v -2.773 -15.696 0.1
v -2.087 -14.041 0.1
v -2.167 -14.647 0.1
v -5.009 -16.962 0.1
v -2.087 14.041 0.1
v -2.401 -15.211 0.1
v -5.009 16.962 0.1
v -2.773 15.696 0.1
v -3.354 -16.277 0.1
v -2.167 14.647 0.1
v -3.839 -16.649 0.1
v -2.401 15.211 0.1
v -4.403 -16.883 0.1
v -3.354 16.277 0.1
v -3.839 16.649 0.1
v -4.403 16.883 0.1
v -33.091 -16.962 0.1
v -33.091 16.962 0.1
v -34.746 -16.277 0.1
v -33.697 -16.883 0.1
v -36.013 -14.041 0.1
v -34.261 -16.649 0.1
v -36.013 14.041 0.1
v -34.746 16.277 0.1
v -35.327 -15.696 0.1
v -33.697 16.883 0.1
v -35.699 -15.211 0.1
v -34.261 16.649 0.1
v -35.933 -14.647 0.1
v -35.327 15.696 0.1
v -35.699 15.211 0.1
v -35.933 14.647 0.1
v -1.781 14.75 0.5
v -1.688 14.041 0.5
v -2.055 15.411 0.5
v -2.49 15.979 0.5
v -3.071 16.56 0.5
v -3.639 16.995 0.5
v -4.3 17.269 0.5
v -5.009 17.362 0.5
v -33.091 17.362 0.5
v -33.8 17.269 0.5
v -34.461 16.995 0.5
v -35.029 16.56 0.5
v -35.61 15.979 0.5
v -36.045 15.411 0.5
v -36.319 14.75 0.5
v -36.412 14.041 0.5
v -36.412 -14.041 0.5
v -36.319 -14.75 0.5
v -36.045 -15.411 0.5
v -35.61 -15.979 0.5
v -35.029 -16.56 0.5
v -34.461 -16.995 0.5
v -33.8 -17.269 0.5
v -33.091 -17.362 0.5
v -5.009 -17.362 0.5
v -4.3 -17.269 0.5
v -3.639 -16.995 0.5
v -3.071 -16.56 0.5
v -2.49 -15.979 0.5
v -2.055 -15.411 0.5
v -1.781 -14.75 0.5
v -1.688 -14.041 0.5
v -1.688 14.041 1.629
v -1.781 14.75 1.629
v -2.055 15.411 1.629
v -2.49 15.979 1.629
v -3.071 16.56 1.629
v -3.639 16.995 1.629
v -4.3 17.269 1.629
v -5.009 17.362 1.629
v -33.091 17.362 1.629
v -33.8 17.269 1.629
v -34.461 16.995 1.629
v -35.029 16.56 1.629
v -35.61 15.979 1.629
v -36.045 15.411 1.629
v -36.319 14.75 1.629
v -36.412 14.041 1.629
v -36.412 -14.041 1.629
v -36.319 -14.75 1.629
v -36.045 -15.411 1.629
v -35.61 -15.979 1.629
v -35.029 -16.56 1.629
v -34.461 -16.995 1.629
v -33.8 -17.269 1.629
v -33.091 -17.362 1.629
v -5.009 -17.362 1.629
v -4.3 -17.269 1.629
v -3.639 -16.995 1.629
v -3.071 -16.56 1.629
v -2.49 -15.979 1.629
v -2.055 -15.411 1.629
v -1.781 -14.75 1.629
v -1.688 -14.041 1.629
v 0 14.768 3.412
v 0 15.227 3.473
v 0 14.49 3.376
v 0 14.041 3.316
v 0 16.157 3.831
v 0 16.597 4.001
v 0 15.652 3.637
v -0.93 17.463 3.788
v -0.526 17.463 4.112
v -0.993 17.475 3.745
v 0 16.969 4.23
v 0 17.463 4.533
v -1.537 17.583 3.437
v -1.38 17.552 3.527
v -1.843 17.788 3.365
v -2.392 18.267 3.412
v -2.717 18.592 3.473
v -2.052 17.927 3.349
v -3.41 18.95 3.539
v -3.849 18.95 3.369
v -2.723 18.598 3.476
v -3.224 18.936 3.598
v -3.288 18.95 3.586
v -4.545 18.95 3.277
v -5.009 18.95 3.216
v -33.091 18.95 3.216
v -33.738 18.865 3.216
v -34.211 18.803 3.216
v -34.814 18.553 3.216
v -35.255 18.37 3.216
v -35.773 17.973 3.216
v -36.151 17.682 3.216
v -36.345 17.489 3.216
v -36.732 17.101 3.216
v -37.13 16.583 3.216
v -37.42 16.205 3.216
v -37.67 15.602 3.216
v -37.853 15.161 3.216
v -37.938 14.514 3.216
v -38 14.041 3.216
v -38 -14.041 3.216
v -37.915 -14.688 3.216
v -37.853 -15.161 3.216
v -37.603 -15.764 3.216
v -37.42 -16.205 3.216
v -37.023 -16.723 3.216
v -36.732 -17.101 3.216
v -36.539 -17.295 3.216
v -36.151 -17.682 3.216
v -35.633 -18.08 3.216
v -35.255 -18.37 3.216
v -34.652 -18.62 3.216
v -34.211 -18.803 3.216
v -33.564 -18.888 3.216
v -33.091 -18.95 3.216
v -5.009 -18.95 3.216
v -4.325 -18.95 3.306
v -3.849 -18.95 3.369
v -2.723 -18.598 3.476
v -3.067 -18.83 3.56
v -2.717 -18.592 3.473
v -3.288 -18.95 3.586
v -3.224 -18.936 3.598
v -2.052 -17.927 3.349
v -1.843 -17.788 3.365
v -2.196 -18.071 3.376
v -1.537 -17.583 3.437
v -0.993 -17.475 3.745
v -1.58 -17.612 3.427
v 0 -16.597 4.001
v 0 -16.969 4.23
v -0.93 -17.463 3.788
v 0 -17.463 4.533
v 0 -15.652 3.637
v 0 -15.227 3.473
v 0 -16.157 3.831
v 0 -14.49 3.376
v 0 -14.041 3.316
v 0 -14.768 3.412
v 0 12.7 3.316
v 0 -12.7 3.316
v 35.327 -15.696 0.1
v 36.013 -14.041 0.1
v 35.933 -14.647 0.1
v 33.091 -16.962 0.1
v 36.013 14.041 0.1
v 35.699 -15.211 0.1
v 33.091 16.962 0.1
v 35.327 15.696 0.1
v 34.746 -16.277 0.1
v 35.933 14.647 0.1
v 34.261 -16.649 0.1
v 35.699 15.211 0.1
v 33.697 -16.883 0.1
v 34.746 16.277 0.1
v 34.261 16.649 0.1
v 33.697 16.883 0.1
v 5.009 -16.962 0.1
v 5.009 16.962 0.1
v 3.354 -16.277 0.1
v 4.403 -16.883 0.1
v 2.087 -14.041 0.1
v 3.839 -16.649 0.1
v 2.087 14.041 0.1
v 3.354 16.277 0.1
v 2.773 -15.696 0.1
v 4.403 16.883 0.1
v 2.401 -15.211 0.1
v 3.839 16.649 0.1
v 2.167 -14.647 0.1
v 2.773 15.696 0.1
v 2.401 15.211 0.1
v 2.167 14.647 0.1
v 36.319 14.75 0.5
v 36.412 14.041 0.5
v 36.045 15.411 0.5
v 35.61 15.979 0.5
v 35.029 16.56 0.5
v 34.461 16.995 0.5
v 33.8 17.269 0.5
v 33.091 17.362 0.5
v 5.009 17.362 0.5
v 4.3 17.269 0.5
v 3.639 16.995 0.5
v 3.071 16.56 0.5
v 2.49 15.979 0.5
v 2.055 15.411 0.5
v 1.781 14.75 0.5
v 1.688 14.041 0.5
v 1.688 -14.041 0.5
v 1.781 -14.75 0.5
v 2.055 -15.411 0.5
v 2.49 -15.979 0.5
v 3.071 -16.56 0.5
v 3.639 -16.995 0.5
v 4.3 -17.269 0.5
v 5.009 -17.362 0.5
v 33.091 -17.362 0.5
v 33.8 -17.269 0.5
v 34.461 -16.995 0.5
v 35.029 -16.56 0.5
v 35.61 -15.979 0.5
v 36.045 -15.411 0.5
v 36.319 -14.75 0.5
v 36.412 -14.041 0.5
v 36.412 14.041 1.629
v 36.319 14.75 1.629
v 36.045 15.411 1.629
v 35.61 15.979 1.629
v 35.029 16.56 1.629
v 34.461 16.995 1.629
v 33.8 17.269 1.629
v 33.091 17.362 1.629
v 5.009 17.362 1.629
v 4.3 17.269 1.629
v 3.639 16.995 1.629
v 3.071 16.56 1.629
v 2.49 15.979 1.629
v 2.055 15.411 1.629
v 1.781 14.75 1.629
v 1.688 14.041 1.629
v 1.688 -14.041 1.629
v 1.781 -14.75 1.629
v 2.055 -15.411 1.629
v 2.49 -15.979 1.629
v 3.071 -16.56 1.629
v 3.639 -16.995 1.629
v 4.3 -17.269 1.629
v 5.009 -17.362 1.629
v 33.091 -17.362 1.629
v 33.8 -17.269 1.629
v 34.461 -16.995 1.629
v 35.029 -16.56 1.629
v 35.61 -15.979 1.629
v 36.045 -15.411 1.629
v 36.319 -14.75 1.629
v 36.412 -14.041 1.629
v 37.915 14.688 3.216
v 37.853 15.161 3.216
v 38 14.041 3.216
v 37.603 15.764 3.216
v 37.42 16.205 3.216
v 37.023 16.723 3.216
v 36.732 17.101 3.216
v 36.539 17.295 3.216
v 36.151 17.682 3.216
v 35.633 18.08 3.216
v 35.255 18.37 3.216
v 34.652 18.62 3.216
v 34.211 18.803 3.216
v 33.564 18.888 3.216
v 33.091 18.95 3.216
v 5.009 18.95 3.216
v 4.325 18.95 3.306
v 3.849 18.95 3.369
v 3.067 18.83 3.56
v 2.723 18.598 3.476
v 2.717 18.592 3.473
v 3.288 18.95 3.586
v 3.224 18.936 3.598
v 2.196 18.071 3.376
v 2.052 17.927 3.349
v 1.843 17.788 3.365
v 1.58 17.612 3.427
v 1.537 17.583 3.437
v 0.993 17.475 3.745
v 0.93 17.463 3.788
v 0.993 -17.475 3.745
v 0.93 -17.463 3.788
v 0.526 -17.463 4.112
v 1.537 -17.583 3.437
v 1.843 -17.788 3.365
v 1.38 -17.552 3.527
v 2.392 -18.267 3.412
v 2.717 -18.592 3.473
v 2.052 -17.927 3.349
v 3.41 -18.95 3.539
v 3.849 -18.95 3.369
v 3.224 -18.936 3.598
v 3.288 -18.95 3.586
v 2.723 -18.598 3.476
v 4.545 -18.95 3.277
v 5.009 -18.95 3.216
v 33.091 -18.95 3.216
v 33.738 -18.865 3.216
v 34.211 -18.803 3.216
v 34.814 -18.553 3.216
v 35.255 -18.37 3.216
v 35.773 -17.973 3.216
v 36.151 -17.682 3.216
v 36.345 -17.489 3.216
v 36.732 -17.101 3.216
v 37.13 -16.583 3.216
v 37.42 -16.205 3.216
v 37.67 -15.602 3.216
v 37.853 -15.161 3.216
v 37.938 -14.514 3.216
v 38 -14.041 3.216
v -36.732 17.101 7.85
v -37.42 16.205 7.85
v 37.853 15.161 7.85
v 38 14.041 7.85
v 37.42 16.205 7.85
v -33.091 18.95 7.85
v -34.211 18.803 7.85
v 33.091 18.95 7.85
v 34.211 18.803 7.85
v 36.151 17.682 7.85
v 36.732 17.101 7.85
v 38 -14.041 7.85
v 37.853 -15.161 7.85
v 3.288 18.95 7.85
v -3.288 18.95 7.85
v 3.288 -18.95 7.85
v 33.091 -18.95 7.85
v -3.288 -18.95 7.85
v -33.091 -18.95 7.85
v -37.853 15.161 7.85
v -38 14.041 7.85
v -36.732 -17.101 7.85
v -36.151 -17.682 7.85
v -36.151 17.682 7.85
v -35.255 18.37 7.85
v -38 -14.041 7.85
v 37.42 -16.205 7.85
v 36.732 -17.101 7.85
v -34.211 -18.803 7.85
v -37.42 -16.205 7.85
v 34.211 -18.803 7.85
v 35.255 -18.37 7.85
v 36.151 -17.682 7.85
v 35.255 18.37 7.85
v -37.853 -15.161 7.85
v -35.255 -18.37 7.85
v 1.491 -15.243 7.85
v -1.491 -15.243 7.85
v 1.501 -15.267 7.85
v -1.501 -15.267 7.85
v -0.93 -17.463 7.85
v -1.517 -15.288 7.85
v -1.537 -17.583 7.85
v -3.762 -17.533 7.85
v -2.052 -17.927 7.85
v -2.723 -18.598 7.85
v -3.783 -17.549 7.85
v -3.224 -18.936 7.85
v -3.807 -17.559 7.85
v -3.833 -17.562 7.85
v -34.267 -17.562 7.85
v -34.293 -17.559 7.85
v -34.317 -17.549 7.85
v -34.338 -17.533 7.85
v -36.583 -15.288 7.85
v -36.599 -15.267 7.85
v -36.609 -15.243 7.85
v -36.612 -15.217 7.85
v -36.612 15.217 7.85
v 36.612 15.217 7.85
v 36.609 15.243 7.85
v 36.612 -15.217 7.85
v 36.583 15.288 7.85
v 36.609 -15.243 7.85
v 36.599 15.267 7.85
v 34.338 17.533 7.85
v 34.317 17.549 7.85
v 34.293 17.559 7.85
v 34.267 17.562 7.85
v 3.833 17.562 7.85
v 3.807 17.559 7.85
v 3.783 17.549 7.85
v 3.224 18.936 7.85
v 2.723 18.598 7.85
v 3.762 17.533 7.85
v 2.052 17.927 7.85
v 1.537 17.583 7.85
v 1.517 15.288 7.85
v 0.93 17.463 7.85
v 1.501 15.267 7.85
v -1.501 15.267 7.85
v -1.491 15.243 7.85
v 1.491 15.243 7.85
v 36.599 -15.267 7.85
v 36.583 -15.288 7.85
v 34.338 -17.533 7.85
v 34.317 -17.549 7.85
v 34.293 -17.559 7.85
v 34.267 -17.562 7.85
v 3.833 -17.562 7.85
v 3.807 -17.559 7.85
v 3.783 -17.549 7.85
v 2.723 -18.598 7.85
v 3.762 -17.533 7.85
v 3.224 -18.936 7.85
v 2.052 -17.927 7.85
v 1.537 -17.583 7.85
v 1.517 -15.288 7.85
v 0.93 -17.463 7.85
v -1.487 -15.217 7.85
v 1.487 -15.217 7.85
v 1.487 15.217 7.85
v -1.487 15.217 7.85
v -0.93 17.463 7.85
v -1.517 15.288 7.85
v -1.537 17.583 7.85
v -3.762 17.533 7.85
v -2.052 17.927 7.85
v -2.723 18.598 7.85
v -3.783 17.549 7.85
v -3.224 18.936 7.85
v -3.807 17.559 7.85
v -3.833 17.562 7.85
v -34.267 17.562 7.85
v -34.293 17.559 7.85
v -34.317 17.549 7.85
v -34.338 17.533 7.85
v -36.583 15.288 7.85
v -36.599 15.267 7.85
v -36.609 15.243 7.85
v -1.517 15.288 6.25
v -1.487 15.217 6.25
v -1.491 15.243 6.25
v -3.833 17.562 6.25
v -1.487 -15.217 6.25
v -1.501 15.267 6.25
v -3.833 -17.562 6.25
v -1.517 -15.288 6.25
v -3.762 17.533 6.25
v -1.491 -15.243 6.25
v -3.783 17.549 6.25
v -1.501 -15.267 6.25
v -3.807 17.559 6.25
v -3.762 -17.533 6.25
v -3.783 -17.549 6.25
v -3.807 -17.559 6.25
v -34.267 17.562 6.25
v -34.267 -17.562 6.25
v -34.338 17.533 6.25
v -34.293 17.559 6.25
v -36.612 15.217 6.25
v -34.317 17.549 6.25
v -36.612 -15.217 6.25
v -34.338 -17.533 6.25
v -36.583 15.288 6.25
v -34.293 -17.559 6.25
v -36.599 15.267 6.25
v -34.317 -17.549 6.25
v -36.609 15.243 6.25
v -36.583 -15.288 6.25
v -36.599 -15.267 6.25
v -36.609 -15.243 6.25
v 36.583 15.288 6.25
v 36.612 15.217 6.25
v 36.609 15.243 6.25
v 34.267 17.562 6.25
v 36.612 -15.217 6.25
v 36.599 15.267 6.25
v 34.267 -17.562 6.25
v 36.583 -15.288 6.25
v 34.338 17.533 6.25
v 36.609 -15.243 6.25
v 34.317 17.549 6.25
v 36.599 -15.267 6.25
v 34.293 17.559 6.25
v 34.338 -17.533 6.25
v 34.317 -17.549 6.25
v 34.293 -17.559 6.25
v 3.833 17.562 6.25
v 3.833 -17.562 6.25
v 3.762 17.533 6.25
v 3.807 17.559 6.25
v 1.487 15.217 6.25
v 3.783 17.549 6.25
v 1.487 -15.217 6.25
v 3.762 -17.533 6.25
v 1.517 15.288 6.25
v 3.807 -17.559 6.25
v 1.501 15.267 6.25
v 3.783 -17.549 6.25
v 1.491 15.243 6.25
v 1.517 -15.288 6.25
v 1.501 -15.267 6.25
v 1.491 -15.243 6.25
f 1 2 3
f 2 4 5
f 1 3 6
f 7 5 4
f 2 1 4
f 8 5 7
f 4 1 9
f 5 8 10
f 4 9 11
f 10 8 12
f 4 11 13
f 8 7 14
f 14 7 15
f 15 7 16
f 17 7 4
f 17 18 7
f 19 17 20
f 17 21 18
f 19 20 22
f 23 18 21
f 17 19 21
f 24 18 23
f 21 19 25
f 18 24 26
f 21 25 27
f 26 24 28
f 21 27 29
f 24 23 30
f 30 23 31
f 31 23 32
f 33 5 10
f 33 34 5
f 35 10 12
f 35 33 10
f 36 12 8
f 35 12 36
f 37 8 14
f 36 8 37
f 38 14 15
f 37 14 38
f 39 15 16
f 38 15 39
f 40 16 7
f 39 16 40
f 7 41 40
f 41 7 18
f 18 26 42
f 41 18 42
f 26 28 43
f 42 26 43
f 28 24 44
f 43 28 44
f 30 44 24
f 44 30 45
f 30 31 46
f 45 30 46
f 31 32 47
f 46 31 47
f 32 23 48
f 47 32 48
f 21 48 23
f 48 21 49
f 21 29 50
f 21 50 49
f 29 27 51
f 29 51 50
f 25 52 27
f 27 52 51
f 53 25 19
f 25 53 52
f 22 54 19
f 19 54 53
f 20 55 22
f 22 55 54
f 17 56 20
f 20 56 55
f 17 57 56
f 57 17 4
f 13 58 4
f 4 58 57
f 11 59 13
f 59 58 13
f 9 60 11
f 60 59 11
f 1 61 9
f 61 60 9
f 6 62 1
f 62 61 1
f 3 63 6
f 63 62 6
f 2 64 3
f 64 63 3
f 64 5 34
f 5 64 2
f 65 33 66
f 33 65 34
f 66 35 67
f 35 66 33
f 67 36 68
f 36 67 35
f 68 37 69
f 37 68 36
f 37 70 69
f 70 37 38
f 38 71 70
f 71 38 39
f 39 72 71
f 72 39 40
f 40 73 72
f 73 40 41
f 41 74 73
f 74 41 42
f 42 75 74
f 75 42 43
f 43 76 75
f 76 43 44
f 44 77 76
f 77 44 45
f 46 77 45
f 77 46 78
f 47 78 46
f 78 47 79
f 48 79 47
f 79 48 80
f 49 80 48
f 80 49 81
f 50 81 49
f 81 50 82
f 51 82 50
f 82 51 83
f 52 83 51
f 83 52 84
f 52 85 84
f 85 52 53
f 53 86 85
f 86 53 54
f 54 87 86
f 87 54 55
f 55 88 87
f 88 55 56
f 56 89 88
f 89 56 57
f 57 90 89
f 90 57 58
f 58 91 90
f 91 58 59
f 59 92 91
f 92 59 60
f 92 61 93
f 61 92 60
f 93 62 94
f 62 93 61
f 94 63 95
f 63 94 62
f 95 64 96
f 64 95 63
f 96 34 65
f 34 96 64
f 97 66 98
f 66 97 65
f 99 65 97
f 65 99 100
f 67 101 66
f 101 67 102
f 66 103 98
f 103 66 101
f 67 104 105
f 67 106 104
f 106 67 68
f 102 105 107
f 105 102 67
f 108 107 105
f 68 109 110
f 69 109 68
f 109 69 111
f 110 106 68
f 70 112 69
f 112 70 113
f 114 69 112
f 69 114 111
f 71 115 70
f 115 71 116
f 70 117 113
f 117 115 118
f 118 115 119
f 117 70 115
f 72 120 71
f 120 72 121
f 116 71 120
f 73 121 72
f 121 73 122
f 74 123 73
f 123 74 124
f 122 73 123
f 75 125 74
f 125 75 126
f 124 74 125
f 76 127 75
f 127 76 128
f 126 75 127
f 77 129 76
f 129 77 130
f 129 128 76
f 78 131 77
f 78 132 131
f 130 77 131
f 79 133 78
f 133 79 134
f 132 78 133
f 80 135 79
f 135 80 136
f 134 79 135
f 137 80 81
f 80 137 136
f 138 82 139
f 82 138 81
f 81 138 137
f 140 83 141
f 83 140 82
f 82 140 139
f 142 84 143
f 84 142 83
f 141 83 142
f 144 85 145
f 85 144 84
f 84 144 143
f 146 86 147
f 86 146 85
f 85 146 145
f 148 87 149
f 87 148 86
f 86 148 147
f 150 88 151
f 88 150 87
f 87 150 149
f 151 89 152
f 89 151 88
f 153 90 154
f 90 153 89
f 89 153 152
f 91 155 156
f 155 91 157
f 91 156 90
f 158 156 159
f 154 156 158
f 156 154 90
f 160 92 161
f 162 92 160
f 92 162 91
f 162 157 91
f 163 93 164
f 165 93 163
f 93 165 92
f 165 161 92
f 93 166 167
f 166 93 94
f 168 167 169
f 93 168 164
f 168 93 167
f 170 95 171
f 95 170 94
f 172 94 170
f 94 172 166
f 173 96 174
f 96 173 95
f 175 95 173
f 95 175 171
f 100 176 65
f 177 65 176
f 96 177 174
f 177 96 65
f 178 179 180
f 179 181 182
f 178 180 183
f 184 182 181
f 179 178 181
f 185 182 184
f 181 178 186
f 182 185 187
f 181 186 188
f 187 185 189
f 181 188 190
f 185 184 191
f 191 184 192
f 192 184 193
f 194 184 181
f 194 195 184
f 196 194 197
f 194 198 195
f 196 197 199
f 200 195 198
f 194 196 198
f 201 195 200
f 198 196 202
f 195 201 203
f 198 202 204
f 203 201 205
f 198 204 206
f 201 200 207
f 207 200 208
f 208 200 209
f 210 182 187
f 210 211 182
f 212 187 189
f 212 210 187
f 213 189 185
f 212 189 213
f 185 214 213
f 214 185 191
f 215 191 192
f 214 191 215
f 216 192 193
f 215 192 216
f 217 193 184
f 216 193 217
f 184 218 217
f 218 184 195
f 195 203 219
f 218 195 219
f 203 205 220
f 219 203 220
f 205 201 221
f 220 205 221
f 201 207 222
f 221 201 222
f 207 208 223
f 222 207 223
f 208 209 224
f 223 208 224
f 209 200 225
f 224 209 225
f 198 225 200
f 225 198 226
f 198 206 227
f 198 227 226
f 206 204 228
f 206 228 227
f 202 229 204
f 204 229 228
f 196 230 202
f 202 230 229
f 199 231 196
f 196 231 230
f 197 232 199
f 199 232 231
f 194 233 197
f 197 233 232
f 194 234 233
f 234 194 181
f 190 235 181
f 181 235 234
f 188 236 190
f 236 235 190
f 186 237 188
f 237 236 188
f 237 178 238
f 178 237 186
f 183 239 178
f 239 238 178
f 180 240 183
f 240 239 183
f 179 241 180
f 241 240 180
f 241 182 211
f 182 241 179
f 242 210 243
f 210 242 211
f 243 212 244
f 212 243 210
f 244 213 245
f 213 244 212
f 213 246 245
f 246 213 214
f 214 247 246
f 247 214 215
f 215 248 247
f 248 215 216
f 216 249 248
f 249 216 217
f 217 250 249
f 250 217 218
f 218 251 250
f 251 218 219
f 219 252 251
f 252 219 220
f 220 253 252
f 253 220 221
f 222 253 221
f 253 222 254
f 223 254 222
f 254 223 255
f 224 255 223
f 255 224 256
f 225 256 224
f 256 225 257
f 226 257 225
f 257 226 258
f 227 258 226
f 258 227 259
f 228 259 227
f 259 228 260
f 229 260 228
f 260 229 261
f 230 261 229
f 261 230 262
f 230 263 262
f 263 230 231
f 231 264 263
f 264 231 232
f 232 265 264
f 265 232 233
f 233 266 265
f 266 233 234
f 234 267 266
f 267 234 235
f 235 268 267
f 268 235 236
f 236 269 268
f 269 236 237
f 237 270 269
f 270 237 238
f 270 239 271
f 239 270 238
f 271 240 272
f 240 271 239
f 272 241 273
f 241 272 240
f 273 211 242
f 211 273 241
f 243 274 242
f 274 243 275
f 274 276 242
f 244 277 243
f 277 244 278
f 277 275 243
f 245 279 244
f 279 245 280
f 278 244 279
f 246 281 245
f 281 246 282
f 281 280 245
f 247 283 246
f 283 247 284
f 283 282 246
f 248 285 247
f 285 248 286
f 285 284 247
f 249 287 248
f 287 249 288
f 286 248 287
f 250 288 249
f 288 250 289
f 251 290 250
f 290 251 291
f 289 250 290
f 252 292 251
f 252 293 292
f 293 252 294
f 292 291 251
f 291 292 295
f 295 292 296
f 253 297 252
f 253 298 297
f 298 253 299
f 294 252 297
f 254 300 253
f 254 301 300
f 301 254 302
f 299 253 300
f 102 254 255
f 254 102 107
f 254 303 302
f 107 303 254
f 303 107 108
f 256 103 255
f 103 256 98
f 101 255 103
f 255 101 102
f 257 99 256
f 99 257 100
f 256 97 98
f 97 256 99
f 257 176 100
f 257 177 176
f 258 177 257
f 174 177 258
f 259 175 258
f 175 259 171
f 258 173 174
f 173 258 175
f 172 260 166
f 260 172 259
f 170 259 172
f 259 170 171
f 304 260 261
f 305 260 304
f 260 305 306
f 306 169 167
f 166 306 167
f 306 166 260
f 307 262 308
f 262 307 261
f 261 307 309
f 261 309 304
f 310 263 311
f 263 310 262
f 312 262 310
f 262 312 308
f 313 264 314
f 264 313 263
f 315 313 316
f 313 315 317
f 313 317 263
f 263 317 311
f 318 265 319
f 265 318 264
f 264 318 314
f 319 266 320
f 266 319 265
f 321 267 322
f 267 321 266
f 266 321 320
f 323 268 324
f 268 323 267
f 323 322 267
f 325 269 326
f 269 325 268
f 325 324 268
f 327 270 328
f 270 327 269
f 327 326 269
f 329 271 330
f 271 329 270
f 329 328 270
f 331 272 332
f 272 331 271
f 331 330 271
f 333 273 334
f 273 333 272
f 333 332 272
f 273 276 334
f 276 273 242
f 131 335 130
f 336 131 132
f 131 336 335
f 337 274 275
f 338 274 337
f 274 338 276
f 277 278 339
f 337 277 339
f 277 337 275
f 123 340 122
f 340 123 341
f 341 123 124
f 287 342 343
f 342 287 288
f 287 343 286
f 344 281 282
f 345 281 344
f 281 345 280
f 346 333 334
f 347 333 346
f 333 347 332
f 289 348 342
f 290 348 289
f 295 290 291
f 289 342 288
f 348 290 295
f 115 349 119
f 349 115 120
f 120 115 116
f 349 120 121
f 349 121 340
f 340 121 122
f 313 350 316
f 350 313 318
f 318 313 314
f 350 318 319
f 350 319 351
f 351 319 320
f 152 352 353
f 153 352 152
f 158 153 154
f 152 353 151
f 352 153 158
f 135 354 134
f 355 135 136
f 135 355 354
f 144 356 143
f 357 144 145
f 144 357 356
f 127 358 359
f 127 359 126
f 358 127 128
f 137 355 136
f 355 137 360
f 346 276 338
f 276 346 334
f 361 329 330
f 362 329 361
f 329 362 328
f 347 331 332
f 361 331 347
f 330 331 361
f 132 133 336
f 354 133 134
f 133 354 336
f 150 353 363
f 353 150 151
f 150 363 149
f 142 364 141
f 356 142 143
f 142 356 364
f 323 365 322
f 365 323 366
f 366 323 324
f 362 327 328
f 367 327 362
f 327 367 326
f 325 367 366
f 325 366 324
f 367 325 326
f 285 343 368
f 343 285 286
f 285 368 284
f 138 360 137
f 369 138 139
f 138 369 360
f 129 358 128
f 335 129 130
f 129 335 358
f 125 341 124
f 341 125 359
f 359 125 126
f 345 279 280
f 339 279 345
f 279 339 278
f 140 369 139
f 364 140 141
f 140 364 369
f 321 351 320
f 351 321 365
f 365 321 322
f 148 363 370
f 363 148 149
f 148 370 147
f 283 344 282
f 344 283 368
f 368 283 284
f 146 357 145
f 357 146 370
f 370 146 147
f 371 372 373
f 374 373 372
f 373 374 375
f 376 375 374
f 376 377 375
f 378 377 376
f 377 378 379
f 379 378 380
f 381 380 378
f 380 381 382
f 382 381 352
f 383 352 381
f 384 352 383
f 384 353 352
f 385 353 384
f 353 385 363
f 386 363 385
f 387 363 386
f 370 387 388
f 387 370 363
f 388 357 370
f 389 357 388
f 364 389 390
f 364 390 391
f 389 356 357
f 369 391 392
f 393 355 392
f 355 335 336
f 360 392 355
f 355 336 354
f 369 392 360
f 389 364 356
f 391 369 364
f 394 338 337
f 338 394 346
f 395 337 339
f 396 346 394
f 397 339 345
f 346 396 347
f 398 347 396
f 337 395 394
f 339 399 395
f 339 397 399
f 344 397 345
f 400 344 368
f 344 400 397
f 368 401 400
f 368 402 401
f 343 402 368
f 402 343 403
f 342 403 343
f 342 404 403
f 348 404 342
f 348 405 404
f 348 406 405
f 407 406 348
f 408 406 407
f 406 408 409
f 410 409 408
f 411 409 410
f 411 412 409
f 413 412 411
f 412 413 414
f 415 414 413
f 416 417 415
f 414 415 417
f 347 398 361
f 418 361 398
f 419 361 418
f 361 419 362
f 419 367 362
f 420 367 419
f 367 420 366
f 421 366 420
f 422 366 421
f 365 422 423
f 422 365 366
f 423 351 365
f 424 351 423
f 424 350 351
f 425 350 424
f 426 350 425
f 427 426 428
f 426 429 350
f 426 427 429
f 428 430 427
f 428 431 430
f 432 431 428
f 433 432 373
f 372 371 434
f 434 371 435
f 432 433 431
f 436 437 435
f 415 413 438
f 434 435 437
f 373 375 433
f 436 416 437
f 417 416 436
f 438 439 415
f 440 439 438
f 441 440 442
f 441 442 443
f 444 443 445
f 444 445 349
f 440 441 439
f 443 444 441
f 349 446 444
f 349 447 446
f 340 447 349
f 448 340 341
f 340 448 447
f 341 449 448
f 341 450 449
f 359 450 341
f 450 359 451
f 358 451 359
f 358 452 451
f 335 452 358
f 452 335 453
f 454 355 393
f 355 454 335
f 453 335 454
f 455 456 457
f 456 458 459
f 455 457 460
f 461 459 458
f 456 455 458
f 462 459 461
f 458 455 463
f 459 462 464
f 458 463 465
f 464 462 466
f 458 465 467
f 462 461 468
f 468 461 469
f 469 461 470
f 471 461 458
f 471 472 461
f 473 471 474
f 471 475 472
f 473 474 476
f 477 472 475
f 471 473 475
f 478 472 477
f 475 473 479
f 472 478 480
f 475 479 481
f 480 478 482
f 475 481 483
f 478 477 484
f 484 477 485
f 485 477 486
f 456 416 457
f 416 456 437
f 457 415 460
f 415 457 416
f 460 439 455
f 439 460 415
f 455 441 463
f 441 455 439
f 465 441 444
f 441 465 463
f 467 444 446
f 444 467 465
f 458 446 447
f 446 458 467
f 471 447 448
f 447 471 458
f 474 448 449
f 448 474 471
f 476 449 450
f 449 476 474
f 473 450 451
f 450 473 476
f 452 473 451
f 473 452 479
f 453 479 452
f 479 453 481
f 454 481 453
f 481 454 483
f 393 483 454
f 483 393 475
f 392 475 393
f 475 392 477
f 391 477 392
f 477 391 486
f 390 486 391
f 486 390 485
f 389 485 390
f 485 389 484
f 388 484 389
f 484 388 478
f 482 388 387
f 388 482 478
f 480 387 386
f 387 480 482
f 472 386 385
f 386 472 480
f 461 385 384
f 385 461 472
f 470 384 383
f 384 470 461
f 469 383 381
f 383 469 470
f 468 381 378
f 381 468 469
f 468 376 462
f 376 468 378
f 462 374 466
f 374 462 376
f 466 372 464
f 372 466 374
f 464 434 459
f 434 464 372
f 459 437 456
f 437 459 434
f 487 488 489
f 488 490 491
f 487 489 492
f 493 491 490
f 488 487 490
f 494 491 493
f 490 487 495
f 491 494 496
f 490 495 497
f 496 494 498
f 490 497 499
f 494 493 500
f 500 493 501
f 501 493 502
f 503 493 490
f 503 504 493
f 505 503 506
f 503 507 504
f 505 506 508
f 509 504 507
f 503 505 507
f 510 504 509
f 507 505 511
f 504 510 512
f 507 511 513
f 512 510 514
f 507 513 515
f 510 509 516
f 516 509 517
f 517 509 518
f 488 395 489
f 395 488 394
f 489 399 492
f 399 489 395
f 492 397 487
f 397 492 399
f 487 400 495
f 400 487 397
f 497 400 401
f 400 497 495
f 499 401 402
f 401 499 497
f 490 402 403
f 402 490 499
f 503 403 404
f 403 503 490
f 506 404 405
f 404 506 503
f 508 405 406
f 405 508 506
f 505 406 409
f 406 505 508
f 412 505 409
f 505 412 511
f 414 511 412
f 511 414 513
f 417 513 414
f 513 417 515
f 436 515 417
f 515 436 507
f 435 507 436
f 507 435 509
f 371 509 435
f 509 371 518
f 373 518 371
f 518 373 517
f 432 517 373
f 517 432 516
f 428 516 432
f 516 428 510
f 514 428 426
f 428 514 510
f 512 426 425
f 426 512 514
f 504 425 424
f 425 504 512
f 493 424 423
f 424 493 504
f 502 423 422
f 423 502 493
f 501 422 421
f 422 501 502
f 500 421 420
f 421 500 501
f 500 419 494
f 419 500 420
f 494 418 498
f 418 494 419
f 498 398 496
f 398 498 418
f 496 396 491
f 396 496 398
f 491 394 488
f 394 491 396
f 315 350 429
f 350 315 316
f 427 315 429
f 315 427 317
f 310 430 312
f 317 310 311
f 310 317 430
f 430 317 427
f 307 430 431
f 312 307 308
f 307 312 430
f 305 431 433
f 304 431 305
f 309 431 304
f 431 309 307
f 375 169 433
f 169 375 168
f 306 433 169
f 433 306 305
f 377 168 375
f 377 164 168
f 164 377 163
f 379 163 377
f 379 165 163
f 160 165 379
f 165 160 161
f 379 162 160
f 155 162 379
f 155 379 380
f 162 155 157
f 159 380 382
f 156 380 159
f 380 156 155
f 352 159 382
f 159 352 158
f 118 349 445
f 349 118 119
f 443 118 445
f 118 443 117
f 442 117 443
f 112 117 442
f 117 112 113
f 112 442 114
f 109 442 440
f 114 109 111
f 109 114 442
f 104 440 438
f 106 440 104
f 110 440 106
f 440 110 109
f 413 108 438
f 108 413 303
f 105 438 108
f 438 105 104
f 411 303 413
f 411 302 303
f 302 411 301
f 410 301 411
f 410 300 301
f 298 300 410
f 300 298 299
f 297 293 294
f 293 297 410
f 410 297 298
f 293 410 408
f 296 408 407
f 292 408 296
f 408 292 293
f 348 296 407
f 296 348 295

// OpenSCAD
// ChunkyPlate0.1
// 
// Baseplate that intentionally 'comes in between chunks'
// to leave room for string/tape

block_size = ["2chunk","1chunk","1/4inch"];
bottom_segmentation = "chunk";
bottom_v6hc_style = "none"; // ["none","v6.1"]
bottom_foot_bevel = "0.4mm";
top_segmentation = "chunk";
top_v6hc_style = "none"; // ["none","v6.1"]
foot_rounding = 0.7; // [0.25:0.1:1]
notch_depth = "1/8inch";
notch_width = "1/4inch";
lip_height = 1.5;

cross_section = false;

$fn = 24;
$tgx11_offset = -0.1;

module __chunkyplate0__end_params() { }

use <../lib/TOGArrayLib1.scad>
use <../lib/TGx11.1Lib.scad>
use <../lib/TOGMod1.scad>
use <../lib/TOGMod1Constructors.scad>
use <../lib/TOGPath1.scad>
use <../lib/TOGUnits1.scad>
use <../lib/TOGPolyhedronLib1.scad>

$togridlib3_unit_table = [
	// Hey, this should only apply to the feet, not to the sides of the cup!
	["tgp-m-outer-corner-radius", [255/64*foot_rounding,"u"]],
	each tgx11_get_default_unit_table()
];

bottom_foot_bevel_mm = togunits1_decode(bottom_foot_bevel);
chunk = togunits1_decode([1,"chunk"]);
block_size_ca = togunits1_vec_to_cas(block_size);
block_size_mm = togunits1_decode_vec(block_size_ca);
block_size_chunks = togunits1_decode_vec(block_size_ca, unit=[1,"chunk"]);
notch_size_mm = togunits1_decode_vec([notch_width, notch_depth]);

notch_bev_mm = tal1_reduce(1000, notch_size_mm, function(a,b) min(a,b));

// TODO: Allow for wider notches
x_face_notch = togmod1_linear_extrude_z(
	[-1, block_size_mm[2]+lip_height+1],
	togpath1_rath_to_polygon(["togpath1-rath",
		["togpath1-rathnode", [ notch_size_mm[0]/2+5, -8  ]],
		["togpath1-rathnode", [ notch_size_mm[0]/2+5, -0.1]],
		["togpath1-rathnode", [ notch_size_mm[0]/2  ,  0  ], ["round", notch_bev_mm/2]],
		["togpath1-rathnode", [ notch_size_mm[0]/2-notch_bev_mm/2, notch_size_mm[1]/2], ["round", notch_bev_mm/2]],
		["togpath1-rathnode", [-notch_size_mm[0]/2+notch_bev_mm/2, notch_size_mm[1]/2], ["round", notch_bev_mm/2]],
		["togpath1-rathnode", [-notch_size_mm[0]/2  ,  0  ], ["round", notch_bev_mm/2]],
		["togpath1-rathnode", [-notch_size_mm[0]/2-5, -0.1]],
		["togpath1-rathnode", [-notch_size_mm[0]/2-5, -8  ]],
	])
);

the_block = ["difference",
	tgx11_block(
		block_size_ca,
		bottom_segmentation = bottom_segmentation,
		bottom_v6hc_style = bottom_v6hc_style,
		bottom_foot_bevel = bottom_foot_bevel_mm,
		top_segmentation = top_segmentation,
		top_v6hc_style = top_v6hc_style,
		lip_height = lip_height
	),
	
	// Front and back notches
	for( ystuf=[[-block_size_chunks[1]/2, 0], [block_size_chunks[1]/2, 180]] )
	for( xm=[-block_size_chunks[0]/2 + 1 : 1 : block_size_chunks[0]/2-0.9] )
	["translate", [xm*chunk, ystuf[0]*chunk, 0], ["rotate",[0,0,ystuf[1]],x_face_notch]],
	// Side notches
	for( xstuf=[[-block_size_chunks[0]/2, -90], [block_size_chunks[0]/2, 90]] )
	for( ym=[-block_size_chunks[1]/2 + 1 : 1 : block_size_chunks[1]/2-0.9] )
	["translate", [xstuf[0]*chunk, ym*chunk, 0], ["rotate",[0,0,xstuf[1]],x_face_notch]],
];
the_module = ["difference",
	the_block,
];

togmod1_domodule(["difference",
	["union",
		the_module,
	],
	
	if( cross_section ) ["translate", [-19.05,-19.05,19.05], togmod1_make_cuboid([38.1,38.1,100])],
]);
